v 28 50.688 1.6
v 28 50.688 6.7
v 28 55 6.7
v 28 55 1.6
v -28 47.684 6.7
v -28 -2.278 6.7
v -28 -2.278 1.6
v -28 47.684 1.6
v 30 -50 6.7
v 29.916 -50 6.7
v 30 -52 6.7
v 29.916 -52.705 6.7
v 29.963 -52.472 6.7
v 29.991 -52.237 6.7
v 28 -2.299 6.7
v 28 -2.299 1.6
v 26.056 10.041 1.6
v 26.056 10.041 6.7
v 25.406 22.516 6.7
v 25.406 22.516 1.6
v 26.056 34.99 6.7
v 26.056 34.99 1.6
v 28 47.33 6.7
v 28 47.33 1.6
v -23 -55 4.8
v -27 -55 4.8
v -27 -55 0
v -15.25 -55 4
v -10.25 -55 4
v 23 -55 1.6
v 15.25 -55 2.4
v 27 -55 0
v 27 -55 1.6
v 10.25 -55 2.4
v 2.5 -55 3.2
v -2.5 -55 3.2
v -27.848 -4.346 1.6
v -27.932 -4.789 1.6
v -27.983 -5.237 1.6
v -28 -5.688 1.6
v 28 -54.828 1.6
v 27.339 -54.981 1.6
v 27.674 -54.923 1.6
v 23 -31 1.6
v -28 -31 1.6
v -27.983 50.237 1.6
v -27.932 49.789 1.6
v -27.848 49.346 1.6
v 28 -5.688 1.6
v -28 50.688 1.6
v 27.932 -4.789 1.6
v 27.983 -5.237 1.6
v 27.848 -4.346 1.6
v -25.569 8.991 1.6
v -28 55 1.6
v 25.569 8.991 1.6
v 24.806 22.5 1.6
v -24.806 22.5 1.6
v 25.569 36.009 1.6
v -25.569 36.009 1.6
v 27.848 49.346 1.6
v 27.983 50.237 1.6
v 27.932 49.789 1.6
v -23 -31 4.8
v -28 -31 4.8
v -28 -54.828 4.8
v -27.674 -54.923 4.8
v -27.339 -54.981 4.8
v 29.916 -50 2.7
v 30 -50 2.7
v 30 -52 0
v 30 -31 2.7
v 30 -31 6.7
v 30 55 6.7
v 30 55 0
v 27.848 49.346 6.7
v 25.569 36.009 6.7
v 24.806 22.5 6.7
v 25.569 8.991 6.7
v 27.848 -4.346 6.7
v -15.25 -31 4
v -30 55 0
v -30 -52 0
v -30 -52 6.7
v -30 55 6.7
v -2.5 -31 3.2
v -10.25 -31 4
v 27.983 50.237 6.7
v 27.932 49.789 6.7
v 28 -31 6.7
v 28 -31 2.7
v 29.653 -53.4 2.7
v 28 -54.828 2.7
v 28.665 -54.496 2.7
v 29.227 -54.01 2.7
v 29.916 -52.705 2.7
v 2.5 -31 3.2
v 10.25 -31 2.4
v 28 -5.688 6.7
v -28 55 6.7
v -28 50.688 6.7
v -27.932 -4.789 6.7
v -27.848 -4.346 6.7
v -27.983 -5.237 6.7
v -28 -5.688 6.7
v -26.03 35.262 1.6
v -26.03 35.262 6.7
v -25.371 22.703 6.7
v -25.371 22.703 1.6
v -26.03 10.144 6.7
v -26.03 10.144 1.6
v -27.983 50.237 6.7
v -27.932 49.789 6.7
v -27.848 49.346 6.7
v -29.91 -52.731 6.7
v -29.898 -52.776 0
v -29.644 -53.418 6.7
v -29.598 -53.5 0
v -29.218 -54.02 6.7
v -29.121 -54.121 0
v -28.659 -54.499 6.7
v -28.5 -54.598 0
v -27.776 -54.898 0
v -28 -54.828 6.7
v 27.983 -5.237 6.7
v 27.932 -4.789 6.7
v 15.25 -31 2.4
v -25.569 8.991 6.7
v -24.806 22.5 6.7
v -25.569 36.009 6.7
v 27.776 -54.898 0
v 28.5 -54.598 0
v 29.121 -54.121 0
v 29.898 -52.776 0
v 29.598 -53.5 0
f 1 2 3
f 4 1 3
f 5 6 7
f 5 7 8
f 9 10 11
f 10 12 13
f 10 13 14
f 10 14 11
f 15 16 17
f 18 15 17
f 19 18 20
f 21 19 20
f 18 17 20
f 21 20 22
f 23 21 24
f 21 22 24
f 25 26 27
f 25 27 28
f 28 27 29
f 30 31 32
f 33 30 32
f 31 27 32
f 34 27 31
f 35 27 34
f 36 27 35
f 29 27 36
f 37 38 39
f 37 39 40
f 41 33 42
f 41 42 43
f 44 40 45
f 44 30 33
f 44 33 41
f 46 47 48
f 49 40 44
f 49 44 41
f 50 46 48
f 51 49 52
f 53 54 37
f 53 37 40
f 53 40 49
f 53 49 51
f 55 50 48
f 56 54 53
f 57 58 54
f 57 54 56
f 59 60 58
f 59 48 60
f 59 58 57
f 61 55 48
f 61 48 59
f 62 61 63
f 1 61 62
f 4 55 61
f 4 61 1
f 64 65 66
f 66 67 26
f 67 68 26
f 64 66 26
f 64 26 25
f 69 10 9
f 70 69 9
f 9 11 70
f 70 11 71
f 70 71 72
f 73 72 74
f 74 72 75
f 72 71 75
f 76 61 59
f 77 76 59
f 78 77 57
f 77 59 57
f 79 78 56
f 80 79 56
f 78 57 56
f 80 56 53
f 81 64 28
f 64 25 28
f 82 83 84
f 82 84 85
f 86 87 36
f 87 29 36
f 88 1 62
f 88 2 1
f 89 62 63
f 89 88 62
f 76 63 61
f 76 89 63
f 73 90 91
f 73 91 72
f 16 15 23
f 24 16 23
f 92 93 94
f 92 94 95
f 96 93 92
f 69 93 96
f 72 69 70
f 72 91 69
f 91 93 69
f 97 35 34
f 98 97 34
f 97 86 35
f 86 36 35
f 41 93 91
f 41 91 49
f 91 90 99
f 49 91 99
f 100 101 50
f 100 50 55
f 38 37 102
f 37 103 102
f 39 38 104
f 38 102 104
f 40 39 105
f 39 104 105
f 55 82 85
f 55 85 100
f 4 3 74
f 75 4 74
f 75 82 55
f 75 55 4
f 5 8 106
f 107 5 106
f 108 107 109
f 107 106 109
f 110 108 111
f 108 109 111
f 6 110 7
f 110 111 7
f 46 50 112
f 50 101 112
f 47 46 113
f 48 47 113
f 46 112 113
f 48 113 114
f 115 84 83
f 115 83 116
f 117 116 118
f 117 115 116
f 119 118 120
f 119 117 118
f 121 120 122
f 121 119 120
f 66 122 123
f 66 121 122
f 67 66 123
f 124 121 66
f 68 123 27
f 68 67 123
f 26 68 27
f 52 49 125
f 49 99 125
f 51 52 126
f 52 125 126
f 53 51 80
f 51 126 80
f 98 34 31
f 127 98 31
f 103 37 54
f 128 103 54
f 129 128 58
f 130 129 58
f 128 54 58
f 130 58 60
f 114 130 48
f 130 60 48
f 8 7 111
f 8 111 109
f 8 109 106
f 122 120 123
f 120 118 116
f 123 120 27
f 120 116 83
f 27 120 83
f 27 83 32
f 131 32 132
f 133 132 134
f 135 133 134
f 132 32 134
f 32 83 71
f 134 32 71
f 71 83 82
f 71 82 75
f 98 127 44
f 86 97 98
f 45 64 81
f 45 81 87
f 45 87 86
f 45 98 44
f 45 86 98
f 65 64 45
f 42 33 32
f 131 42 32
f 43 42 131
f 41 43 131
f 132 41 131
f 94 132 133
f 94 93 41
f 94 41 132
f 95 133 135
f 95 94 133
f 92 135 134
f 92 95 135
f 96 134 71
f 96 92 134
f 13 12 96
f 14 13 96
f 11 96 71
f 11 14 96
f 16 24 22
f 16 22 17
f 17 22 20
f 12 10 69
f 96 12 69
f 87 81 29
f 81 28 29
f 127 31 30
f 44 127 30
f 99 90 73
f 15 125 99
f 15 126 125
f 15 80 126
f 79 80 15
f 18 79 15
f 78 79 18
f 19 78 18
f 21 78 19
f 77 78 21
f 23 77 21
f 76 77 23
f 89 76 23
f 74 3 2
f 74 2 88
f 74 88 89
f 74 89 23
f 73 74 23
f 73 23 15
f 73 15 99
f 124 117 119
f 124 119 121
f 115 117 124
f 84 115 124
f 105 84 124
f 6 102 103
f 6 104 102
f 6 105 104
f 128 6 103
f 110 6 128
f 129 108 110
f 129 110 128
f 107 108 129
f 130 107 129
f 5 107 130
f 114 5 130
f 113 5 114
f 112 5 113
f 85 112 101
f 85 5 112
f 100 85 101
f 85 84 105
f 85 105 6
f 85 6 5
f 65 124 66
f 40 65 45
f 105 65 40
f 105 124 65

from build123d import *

# Parameters (mm, degrees)
F0_W      = 60
F0_H      = 110
F1_DEPTH  = 6.7
F2_W      = 56
F2_H      = 105
F3_DEPTH  = 5.1
F5_DEPTH  = 5.1
F6_R      = 3
F7_R      = 6
F9_DEPTH  = 19
F10_W     = 2
F10_H     = 19
F11_DEPTH = 4
F13_DEPTH = 25


with BuildPart() as f1:
    # F0 (on Top) → F1 (new body)
    with BuildSketch(Plane.XY):
        Rectangle(F0_W, F0_H)
    extrude(amount=F1_DEPTH)

    # F2 (on face) → F3 (cut)
    with BuildSketch(Plane.XY.offset(6.7)):
        with Locations((0, 2.5)):
            Rectangle(F2_W, F2_H)
    extrude(amount=-F3_DEPTH, mode=Mode.SUBTRACT)

    # F4 (on face) → F5 (join)
    with BuildSketch(Plane.XY.offset(1.6)):
        with BuildLine():
            Line((-28, -2.277589744), (-28, -5))
            ThreePointArc((-28, -5), (-24.8064638622, 22.5), (-28, 50))
            Line((-28, 50), (-28, 47.6836016319))
            ThreePointArc((-28, 47.6836016319), (-25.3710775237, 22.703005944), (-28, -2.277589744))
        make_face()
        with BuildLine():
            Line((28, 47.3302031996), (28, 50))
            ThreePointArc((28, 50), (24.8064638622, 22.5), (28, -5))
            Line((28, -5), (28, -2.2991948615))
            ThreePointArc((28, -2.2991948615), (25.4062635127, 22.515504169), (28, 47.3302031996))
        make_face()
    extrude(amount=F5_DEPTH)

    # F6
    f6_edges = [f1.edges().sort_by_distance(p)[0] for p in [
        (-30, -55, 3.35),
        (30, -55, 3.35),
    ]]
    fillet(f6_edges, radius=F6_R)

    # F7
    f7_edges = [f1.edges().sort_by_distance(p)[0] for p in [
        (28, -5, 4.15),
        (-28, -5, 4.15),
        (-28, 50, 4.15),
        (28, 50, 4.15),
    ]]
    fillet(f7_edges, radius=F7_R)

    # F8 (on face) → F9 (join)
    with BuildSketch(Plane(origin=(0, -50, 0), x_dir=(-1, 0, 0), z_dir=(0, 1, 0))):
        Polygon((-15.25, 2.4), (-23, 1.6), (28, 1.6), (28, 4.8), (23, 4.8), (15.25, 4), (10.25, 4), (2.5, 3.2), (-2.5, 3.2), (-10.25, 2.4), align=None)
    extrude(amount=F9_DEPTH)

    # F10 (on face) → F11 (cut)
    with BuildSketch(Plane.XY.offset(6.7)):
        with Locations((29, -40.5)):
            Rectangle(F10_W, F10_H)
    extrude(amount=-F11_DEPTH, mode=Mode.SUBTRACT)

    # F12 (on face) → F13 (cut)
    with BuildSketch(Plane(origin=(0, -50, 0), x_dir=(-1, 0, 0), z_dir=(0, 1, 0))):
        Polygon((23, 4.8), (28, 4.8), (28, 6.7), (-29.9160797831, 6.7), (-29.9160797831, 2.7), (-28, 2.7), (-28, 1.6), (-23, 1.6), (-15.25, 2.4), (-10.25, 2.4), (-2.5, 3.2), (2.5, 3.2), (10.25, 4), (15.25, 4), align=None)
    extrude(amount=-F13_DEPTH, mode=Mode.SUBTRACT)


solid = f1.part
